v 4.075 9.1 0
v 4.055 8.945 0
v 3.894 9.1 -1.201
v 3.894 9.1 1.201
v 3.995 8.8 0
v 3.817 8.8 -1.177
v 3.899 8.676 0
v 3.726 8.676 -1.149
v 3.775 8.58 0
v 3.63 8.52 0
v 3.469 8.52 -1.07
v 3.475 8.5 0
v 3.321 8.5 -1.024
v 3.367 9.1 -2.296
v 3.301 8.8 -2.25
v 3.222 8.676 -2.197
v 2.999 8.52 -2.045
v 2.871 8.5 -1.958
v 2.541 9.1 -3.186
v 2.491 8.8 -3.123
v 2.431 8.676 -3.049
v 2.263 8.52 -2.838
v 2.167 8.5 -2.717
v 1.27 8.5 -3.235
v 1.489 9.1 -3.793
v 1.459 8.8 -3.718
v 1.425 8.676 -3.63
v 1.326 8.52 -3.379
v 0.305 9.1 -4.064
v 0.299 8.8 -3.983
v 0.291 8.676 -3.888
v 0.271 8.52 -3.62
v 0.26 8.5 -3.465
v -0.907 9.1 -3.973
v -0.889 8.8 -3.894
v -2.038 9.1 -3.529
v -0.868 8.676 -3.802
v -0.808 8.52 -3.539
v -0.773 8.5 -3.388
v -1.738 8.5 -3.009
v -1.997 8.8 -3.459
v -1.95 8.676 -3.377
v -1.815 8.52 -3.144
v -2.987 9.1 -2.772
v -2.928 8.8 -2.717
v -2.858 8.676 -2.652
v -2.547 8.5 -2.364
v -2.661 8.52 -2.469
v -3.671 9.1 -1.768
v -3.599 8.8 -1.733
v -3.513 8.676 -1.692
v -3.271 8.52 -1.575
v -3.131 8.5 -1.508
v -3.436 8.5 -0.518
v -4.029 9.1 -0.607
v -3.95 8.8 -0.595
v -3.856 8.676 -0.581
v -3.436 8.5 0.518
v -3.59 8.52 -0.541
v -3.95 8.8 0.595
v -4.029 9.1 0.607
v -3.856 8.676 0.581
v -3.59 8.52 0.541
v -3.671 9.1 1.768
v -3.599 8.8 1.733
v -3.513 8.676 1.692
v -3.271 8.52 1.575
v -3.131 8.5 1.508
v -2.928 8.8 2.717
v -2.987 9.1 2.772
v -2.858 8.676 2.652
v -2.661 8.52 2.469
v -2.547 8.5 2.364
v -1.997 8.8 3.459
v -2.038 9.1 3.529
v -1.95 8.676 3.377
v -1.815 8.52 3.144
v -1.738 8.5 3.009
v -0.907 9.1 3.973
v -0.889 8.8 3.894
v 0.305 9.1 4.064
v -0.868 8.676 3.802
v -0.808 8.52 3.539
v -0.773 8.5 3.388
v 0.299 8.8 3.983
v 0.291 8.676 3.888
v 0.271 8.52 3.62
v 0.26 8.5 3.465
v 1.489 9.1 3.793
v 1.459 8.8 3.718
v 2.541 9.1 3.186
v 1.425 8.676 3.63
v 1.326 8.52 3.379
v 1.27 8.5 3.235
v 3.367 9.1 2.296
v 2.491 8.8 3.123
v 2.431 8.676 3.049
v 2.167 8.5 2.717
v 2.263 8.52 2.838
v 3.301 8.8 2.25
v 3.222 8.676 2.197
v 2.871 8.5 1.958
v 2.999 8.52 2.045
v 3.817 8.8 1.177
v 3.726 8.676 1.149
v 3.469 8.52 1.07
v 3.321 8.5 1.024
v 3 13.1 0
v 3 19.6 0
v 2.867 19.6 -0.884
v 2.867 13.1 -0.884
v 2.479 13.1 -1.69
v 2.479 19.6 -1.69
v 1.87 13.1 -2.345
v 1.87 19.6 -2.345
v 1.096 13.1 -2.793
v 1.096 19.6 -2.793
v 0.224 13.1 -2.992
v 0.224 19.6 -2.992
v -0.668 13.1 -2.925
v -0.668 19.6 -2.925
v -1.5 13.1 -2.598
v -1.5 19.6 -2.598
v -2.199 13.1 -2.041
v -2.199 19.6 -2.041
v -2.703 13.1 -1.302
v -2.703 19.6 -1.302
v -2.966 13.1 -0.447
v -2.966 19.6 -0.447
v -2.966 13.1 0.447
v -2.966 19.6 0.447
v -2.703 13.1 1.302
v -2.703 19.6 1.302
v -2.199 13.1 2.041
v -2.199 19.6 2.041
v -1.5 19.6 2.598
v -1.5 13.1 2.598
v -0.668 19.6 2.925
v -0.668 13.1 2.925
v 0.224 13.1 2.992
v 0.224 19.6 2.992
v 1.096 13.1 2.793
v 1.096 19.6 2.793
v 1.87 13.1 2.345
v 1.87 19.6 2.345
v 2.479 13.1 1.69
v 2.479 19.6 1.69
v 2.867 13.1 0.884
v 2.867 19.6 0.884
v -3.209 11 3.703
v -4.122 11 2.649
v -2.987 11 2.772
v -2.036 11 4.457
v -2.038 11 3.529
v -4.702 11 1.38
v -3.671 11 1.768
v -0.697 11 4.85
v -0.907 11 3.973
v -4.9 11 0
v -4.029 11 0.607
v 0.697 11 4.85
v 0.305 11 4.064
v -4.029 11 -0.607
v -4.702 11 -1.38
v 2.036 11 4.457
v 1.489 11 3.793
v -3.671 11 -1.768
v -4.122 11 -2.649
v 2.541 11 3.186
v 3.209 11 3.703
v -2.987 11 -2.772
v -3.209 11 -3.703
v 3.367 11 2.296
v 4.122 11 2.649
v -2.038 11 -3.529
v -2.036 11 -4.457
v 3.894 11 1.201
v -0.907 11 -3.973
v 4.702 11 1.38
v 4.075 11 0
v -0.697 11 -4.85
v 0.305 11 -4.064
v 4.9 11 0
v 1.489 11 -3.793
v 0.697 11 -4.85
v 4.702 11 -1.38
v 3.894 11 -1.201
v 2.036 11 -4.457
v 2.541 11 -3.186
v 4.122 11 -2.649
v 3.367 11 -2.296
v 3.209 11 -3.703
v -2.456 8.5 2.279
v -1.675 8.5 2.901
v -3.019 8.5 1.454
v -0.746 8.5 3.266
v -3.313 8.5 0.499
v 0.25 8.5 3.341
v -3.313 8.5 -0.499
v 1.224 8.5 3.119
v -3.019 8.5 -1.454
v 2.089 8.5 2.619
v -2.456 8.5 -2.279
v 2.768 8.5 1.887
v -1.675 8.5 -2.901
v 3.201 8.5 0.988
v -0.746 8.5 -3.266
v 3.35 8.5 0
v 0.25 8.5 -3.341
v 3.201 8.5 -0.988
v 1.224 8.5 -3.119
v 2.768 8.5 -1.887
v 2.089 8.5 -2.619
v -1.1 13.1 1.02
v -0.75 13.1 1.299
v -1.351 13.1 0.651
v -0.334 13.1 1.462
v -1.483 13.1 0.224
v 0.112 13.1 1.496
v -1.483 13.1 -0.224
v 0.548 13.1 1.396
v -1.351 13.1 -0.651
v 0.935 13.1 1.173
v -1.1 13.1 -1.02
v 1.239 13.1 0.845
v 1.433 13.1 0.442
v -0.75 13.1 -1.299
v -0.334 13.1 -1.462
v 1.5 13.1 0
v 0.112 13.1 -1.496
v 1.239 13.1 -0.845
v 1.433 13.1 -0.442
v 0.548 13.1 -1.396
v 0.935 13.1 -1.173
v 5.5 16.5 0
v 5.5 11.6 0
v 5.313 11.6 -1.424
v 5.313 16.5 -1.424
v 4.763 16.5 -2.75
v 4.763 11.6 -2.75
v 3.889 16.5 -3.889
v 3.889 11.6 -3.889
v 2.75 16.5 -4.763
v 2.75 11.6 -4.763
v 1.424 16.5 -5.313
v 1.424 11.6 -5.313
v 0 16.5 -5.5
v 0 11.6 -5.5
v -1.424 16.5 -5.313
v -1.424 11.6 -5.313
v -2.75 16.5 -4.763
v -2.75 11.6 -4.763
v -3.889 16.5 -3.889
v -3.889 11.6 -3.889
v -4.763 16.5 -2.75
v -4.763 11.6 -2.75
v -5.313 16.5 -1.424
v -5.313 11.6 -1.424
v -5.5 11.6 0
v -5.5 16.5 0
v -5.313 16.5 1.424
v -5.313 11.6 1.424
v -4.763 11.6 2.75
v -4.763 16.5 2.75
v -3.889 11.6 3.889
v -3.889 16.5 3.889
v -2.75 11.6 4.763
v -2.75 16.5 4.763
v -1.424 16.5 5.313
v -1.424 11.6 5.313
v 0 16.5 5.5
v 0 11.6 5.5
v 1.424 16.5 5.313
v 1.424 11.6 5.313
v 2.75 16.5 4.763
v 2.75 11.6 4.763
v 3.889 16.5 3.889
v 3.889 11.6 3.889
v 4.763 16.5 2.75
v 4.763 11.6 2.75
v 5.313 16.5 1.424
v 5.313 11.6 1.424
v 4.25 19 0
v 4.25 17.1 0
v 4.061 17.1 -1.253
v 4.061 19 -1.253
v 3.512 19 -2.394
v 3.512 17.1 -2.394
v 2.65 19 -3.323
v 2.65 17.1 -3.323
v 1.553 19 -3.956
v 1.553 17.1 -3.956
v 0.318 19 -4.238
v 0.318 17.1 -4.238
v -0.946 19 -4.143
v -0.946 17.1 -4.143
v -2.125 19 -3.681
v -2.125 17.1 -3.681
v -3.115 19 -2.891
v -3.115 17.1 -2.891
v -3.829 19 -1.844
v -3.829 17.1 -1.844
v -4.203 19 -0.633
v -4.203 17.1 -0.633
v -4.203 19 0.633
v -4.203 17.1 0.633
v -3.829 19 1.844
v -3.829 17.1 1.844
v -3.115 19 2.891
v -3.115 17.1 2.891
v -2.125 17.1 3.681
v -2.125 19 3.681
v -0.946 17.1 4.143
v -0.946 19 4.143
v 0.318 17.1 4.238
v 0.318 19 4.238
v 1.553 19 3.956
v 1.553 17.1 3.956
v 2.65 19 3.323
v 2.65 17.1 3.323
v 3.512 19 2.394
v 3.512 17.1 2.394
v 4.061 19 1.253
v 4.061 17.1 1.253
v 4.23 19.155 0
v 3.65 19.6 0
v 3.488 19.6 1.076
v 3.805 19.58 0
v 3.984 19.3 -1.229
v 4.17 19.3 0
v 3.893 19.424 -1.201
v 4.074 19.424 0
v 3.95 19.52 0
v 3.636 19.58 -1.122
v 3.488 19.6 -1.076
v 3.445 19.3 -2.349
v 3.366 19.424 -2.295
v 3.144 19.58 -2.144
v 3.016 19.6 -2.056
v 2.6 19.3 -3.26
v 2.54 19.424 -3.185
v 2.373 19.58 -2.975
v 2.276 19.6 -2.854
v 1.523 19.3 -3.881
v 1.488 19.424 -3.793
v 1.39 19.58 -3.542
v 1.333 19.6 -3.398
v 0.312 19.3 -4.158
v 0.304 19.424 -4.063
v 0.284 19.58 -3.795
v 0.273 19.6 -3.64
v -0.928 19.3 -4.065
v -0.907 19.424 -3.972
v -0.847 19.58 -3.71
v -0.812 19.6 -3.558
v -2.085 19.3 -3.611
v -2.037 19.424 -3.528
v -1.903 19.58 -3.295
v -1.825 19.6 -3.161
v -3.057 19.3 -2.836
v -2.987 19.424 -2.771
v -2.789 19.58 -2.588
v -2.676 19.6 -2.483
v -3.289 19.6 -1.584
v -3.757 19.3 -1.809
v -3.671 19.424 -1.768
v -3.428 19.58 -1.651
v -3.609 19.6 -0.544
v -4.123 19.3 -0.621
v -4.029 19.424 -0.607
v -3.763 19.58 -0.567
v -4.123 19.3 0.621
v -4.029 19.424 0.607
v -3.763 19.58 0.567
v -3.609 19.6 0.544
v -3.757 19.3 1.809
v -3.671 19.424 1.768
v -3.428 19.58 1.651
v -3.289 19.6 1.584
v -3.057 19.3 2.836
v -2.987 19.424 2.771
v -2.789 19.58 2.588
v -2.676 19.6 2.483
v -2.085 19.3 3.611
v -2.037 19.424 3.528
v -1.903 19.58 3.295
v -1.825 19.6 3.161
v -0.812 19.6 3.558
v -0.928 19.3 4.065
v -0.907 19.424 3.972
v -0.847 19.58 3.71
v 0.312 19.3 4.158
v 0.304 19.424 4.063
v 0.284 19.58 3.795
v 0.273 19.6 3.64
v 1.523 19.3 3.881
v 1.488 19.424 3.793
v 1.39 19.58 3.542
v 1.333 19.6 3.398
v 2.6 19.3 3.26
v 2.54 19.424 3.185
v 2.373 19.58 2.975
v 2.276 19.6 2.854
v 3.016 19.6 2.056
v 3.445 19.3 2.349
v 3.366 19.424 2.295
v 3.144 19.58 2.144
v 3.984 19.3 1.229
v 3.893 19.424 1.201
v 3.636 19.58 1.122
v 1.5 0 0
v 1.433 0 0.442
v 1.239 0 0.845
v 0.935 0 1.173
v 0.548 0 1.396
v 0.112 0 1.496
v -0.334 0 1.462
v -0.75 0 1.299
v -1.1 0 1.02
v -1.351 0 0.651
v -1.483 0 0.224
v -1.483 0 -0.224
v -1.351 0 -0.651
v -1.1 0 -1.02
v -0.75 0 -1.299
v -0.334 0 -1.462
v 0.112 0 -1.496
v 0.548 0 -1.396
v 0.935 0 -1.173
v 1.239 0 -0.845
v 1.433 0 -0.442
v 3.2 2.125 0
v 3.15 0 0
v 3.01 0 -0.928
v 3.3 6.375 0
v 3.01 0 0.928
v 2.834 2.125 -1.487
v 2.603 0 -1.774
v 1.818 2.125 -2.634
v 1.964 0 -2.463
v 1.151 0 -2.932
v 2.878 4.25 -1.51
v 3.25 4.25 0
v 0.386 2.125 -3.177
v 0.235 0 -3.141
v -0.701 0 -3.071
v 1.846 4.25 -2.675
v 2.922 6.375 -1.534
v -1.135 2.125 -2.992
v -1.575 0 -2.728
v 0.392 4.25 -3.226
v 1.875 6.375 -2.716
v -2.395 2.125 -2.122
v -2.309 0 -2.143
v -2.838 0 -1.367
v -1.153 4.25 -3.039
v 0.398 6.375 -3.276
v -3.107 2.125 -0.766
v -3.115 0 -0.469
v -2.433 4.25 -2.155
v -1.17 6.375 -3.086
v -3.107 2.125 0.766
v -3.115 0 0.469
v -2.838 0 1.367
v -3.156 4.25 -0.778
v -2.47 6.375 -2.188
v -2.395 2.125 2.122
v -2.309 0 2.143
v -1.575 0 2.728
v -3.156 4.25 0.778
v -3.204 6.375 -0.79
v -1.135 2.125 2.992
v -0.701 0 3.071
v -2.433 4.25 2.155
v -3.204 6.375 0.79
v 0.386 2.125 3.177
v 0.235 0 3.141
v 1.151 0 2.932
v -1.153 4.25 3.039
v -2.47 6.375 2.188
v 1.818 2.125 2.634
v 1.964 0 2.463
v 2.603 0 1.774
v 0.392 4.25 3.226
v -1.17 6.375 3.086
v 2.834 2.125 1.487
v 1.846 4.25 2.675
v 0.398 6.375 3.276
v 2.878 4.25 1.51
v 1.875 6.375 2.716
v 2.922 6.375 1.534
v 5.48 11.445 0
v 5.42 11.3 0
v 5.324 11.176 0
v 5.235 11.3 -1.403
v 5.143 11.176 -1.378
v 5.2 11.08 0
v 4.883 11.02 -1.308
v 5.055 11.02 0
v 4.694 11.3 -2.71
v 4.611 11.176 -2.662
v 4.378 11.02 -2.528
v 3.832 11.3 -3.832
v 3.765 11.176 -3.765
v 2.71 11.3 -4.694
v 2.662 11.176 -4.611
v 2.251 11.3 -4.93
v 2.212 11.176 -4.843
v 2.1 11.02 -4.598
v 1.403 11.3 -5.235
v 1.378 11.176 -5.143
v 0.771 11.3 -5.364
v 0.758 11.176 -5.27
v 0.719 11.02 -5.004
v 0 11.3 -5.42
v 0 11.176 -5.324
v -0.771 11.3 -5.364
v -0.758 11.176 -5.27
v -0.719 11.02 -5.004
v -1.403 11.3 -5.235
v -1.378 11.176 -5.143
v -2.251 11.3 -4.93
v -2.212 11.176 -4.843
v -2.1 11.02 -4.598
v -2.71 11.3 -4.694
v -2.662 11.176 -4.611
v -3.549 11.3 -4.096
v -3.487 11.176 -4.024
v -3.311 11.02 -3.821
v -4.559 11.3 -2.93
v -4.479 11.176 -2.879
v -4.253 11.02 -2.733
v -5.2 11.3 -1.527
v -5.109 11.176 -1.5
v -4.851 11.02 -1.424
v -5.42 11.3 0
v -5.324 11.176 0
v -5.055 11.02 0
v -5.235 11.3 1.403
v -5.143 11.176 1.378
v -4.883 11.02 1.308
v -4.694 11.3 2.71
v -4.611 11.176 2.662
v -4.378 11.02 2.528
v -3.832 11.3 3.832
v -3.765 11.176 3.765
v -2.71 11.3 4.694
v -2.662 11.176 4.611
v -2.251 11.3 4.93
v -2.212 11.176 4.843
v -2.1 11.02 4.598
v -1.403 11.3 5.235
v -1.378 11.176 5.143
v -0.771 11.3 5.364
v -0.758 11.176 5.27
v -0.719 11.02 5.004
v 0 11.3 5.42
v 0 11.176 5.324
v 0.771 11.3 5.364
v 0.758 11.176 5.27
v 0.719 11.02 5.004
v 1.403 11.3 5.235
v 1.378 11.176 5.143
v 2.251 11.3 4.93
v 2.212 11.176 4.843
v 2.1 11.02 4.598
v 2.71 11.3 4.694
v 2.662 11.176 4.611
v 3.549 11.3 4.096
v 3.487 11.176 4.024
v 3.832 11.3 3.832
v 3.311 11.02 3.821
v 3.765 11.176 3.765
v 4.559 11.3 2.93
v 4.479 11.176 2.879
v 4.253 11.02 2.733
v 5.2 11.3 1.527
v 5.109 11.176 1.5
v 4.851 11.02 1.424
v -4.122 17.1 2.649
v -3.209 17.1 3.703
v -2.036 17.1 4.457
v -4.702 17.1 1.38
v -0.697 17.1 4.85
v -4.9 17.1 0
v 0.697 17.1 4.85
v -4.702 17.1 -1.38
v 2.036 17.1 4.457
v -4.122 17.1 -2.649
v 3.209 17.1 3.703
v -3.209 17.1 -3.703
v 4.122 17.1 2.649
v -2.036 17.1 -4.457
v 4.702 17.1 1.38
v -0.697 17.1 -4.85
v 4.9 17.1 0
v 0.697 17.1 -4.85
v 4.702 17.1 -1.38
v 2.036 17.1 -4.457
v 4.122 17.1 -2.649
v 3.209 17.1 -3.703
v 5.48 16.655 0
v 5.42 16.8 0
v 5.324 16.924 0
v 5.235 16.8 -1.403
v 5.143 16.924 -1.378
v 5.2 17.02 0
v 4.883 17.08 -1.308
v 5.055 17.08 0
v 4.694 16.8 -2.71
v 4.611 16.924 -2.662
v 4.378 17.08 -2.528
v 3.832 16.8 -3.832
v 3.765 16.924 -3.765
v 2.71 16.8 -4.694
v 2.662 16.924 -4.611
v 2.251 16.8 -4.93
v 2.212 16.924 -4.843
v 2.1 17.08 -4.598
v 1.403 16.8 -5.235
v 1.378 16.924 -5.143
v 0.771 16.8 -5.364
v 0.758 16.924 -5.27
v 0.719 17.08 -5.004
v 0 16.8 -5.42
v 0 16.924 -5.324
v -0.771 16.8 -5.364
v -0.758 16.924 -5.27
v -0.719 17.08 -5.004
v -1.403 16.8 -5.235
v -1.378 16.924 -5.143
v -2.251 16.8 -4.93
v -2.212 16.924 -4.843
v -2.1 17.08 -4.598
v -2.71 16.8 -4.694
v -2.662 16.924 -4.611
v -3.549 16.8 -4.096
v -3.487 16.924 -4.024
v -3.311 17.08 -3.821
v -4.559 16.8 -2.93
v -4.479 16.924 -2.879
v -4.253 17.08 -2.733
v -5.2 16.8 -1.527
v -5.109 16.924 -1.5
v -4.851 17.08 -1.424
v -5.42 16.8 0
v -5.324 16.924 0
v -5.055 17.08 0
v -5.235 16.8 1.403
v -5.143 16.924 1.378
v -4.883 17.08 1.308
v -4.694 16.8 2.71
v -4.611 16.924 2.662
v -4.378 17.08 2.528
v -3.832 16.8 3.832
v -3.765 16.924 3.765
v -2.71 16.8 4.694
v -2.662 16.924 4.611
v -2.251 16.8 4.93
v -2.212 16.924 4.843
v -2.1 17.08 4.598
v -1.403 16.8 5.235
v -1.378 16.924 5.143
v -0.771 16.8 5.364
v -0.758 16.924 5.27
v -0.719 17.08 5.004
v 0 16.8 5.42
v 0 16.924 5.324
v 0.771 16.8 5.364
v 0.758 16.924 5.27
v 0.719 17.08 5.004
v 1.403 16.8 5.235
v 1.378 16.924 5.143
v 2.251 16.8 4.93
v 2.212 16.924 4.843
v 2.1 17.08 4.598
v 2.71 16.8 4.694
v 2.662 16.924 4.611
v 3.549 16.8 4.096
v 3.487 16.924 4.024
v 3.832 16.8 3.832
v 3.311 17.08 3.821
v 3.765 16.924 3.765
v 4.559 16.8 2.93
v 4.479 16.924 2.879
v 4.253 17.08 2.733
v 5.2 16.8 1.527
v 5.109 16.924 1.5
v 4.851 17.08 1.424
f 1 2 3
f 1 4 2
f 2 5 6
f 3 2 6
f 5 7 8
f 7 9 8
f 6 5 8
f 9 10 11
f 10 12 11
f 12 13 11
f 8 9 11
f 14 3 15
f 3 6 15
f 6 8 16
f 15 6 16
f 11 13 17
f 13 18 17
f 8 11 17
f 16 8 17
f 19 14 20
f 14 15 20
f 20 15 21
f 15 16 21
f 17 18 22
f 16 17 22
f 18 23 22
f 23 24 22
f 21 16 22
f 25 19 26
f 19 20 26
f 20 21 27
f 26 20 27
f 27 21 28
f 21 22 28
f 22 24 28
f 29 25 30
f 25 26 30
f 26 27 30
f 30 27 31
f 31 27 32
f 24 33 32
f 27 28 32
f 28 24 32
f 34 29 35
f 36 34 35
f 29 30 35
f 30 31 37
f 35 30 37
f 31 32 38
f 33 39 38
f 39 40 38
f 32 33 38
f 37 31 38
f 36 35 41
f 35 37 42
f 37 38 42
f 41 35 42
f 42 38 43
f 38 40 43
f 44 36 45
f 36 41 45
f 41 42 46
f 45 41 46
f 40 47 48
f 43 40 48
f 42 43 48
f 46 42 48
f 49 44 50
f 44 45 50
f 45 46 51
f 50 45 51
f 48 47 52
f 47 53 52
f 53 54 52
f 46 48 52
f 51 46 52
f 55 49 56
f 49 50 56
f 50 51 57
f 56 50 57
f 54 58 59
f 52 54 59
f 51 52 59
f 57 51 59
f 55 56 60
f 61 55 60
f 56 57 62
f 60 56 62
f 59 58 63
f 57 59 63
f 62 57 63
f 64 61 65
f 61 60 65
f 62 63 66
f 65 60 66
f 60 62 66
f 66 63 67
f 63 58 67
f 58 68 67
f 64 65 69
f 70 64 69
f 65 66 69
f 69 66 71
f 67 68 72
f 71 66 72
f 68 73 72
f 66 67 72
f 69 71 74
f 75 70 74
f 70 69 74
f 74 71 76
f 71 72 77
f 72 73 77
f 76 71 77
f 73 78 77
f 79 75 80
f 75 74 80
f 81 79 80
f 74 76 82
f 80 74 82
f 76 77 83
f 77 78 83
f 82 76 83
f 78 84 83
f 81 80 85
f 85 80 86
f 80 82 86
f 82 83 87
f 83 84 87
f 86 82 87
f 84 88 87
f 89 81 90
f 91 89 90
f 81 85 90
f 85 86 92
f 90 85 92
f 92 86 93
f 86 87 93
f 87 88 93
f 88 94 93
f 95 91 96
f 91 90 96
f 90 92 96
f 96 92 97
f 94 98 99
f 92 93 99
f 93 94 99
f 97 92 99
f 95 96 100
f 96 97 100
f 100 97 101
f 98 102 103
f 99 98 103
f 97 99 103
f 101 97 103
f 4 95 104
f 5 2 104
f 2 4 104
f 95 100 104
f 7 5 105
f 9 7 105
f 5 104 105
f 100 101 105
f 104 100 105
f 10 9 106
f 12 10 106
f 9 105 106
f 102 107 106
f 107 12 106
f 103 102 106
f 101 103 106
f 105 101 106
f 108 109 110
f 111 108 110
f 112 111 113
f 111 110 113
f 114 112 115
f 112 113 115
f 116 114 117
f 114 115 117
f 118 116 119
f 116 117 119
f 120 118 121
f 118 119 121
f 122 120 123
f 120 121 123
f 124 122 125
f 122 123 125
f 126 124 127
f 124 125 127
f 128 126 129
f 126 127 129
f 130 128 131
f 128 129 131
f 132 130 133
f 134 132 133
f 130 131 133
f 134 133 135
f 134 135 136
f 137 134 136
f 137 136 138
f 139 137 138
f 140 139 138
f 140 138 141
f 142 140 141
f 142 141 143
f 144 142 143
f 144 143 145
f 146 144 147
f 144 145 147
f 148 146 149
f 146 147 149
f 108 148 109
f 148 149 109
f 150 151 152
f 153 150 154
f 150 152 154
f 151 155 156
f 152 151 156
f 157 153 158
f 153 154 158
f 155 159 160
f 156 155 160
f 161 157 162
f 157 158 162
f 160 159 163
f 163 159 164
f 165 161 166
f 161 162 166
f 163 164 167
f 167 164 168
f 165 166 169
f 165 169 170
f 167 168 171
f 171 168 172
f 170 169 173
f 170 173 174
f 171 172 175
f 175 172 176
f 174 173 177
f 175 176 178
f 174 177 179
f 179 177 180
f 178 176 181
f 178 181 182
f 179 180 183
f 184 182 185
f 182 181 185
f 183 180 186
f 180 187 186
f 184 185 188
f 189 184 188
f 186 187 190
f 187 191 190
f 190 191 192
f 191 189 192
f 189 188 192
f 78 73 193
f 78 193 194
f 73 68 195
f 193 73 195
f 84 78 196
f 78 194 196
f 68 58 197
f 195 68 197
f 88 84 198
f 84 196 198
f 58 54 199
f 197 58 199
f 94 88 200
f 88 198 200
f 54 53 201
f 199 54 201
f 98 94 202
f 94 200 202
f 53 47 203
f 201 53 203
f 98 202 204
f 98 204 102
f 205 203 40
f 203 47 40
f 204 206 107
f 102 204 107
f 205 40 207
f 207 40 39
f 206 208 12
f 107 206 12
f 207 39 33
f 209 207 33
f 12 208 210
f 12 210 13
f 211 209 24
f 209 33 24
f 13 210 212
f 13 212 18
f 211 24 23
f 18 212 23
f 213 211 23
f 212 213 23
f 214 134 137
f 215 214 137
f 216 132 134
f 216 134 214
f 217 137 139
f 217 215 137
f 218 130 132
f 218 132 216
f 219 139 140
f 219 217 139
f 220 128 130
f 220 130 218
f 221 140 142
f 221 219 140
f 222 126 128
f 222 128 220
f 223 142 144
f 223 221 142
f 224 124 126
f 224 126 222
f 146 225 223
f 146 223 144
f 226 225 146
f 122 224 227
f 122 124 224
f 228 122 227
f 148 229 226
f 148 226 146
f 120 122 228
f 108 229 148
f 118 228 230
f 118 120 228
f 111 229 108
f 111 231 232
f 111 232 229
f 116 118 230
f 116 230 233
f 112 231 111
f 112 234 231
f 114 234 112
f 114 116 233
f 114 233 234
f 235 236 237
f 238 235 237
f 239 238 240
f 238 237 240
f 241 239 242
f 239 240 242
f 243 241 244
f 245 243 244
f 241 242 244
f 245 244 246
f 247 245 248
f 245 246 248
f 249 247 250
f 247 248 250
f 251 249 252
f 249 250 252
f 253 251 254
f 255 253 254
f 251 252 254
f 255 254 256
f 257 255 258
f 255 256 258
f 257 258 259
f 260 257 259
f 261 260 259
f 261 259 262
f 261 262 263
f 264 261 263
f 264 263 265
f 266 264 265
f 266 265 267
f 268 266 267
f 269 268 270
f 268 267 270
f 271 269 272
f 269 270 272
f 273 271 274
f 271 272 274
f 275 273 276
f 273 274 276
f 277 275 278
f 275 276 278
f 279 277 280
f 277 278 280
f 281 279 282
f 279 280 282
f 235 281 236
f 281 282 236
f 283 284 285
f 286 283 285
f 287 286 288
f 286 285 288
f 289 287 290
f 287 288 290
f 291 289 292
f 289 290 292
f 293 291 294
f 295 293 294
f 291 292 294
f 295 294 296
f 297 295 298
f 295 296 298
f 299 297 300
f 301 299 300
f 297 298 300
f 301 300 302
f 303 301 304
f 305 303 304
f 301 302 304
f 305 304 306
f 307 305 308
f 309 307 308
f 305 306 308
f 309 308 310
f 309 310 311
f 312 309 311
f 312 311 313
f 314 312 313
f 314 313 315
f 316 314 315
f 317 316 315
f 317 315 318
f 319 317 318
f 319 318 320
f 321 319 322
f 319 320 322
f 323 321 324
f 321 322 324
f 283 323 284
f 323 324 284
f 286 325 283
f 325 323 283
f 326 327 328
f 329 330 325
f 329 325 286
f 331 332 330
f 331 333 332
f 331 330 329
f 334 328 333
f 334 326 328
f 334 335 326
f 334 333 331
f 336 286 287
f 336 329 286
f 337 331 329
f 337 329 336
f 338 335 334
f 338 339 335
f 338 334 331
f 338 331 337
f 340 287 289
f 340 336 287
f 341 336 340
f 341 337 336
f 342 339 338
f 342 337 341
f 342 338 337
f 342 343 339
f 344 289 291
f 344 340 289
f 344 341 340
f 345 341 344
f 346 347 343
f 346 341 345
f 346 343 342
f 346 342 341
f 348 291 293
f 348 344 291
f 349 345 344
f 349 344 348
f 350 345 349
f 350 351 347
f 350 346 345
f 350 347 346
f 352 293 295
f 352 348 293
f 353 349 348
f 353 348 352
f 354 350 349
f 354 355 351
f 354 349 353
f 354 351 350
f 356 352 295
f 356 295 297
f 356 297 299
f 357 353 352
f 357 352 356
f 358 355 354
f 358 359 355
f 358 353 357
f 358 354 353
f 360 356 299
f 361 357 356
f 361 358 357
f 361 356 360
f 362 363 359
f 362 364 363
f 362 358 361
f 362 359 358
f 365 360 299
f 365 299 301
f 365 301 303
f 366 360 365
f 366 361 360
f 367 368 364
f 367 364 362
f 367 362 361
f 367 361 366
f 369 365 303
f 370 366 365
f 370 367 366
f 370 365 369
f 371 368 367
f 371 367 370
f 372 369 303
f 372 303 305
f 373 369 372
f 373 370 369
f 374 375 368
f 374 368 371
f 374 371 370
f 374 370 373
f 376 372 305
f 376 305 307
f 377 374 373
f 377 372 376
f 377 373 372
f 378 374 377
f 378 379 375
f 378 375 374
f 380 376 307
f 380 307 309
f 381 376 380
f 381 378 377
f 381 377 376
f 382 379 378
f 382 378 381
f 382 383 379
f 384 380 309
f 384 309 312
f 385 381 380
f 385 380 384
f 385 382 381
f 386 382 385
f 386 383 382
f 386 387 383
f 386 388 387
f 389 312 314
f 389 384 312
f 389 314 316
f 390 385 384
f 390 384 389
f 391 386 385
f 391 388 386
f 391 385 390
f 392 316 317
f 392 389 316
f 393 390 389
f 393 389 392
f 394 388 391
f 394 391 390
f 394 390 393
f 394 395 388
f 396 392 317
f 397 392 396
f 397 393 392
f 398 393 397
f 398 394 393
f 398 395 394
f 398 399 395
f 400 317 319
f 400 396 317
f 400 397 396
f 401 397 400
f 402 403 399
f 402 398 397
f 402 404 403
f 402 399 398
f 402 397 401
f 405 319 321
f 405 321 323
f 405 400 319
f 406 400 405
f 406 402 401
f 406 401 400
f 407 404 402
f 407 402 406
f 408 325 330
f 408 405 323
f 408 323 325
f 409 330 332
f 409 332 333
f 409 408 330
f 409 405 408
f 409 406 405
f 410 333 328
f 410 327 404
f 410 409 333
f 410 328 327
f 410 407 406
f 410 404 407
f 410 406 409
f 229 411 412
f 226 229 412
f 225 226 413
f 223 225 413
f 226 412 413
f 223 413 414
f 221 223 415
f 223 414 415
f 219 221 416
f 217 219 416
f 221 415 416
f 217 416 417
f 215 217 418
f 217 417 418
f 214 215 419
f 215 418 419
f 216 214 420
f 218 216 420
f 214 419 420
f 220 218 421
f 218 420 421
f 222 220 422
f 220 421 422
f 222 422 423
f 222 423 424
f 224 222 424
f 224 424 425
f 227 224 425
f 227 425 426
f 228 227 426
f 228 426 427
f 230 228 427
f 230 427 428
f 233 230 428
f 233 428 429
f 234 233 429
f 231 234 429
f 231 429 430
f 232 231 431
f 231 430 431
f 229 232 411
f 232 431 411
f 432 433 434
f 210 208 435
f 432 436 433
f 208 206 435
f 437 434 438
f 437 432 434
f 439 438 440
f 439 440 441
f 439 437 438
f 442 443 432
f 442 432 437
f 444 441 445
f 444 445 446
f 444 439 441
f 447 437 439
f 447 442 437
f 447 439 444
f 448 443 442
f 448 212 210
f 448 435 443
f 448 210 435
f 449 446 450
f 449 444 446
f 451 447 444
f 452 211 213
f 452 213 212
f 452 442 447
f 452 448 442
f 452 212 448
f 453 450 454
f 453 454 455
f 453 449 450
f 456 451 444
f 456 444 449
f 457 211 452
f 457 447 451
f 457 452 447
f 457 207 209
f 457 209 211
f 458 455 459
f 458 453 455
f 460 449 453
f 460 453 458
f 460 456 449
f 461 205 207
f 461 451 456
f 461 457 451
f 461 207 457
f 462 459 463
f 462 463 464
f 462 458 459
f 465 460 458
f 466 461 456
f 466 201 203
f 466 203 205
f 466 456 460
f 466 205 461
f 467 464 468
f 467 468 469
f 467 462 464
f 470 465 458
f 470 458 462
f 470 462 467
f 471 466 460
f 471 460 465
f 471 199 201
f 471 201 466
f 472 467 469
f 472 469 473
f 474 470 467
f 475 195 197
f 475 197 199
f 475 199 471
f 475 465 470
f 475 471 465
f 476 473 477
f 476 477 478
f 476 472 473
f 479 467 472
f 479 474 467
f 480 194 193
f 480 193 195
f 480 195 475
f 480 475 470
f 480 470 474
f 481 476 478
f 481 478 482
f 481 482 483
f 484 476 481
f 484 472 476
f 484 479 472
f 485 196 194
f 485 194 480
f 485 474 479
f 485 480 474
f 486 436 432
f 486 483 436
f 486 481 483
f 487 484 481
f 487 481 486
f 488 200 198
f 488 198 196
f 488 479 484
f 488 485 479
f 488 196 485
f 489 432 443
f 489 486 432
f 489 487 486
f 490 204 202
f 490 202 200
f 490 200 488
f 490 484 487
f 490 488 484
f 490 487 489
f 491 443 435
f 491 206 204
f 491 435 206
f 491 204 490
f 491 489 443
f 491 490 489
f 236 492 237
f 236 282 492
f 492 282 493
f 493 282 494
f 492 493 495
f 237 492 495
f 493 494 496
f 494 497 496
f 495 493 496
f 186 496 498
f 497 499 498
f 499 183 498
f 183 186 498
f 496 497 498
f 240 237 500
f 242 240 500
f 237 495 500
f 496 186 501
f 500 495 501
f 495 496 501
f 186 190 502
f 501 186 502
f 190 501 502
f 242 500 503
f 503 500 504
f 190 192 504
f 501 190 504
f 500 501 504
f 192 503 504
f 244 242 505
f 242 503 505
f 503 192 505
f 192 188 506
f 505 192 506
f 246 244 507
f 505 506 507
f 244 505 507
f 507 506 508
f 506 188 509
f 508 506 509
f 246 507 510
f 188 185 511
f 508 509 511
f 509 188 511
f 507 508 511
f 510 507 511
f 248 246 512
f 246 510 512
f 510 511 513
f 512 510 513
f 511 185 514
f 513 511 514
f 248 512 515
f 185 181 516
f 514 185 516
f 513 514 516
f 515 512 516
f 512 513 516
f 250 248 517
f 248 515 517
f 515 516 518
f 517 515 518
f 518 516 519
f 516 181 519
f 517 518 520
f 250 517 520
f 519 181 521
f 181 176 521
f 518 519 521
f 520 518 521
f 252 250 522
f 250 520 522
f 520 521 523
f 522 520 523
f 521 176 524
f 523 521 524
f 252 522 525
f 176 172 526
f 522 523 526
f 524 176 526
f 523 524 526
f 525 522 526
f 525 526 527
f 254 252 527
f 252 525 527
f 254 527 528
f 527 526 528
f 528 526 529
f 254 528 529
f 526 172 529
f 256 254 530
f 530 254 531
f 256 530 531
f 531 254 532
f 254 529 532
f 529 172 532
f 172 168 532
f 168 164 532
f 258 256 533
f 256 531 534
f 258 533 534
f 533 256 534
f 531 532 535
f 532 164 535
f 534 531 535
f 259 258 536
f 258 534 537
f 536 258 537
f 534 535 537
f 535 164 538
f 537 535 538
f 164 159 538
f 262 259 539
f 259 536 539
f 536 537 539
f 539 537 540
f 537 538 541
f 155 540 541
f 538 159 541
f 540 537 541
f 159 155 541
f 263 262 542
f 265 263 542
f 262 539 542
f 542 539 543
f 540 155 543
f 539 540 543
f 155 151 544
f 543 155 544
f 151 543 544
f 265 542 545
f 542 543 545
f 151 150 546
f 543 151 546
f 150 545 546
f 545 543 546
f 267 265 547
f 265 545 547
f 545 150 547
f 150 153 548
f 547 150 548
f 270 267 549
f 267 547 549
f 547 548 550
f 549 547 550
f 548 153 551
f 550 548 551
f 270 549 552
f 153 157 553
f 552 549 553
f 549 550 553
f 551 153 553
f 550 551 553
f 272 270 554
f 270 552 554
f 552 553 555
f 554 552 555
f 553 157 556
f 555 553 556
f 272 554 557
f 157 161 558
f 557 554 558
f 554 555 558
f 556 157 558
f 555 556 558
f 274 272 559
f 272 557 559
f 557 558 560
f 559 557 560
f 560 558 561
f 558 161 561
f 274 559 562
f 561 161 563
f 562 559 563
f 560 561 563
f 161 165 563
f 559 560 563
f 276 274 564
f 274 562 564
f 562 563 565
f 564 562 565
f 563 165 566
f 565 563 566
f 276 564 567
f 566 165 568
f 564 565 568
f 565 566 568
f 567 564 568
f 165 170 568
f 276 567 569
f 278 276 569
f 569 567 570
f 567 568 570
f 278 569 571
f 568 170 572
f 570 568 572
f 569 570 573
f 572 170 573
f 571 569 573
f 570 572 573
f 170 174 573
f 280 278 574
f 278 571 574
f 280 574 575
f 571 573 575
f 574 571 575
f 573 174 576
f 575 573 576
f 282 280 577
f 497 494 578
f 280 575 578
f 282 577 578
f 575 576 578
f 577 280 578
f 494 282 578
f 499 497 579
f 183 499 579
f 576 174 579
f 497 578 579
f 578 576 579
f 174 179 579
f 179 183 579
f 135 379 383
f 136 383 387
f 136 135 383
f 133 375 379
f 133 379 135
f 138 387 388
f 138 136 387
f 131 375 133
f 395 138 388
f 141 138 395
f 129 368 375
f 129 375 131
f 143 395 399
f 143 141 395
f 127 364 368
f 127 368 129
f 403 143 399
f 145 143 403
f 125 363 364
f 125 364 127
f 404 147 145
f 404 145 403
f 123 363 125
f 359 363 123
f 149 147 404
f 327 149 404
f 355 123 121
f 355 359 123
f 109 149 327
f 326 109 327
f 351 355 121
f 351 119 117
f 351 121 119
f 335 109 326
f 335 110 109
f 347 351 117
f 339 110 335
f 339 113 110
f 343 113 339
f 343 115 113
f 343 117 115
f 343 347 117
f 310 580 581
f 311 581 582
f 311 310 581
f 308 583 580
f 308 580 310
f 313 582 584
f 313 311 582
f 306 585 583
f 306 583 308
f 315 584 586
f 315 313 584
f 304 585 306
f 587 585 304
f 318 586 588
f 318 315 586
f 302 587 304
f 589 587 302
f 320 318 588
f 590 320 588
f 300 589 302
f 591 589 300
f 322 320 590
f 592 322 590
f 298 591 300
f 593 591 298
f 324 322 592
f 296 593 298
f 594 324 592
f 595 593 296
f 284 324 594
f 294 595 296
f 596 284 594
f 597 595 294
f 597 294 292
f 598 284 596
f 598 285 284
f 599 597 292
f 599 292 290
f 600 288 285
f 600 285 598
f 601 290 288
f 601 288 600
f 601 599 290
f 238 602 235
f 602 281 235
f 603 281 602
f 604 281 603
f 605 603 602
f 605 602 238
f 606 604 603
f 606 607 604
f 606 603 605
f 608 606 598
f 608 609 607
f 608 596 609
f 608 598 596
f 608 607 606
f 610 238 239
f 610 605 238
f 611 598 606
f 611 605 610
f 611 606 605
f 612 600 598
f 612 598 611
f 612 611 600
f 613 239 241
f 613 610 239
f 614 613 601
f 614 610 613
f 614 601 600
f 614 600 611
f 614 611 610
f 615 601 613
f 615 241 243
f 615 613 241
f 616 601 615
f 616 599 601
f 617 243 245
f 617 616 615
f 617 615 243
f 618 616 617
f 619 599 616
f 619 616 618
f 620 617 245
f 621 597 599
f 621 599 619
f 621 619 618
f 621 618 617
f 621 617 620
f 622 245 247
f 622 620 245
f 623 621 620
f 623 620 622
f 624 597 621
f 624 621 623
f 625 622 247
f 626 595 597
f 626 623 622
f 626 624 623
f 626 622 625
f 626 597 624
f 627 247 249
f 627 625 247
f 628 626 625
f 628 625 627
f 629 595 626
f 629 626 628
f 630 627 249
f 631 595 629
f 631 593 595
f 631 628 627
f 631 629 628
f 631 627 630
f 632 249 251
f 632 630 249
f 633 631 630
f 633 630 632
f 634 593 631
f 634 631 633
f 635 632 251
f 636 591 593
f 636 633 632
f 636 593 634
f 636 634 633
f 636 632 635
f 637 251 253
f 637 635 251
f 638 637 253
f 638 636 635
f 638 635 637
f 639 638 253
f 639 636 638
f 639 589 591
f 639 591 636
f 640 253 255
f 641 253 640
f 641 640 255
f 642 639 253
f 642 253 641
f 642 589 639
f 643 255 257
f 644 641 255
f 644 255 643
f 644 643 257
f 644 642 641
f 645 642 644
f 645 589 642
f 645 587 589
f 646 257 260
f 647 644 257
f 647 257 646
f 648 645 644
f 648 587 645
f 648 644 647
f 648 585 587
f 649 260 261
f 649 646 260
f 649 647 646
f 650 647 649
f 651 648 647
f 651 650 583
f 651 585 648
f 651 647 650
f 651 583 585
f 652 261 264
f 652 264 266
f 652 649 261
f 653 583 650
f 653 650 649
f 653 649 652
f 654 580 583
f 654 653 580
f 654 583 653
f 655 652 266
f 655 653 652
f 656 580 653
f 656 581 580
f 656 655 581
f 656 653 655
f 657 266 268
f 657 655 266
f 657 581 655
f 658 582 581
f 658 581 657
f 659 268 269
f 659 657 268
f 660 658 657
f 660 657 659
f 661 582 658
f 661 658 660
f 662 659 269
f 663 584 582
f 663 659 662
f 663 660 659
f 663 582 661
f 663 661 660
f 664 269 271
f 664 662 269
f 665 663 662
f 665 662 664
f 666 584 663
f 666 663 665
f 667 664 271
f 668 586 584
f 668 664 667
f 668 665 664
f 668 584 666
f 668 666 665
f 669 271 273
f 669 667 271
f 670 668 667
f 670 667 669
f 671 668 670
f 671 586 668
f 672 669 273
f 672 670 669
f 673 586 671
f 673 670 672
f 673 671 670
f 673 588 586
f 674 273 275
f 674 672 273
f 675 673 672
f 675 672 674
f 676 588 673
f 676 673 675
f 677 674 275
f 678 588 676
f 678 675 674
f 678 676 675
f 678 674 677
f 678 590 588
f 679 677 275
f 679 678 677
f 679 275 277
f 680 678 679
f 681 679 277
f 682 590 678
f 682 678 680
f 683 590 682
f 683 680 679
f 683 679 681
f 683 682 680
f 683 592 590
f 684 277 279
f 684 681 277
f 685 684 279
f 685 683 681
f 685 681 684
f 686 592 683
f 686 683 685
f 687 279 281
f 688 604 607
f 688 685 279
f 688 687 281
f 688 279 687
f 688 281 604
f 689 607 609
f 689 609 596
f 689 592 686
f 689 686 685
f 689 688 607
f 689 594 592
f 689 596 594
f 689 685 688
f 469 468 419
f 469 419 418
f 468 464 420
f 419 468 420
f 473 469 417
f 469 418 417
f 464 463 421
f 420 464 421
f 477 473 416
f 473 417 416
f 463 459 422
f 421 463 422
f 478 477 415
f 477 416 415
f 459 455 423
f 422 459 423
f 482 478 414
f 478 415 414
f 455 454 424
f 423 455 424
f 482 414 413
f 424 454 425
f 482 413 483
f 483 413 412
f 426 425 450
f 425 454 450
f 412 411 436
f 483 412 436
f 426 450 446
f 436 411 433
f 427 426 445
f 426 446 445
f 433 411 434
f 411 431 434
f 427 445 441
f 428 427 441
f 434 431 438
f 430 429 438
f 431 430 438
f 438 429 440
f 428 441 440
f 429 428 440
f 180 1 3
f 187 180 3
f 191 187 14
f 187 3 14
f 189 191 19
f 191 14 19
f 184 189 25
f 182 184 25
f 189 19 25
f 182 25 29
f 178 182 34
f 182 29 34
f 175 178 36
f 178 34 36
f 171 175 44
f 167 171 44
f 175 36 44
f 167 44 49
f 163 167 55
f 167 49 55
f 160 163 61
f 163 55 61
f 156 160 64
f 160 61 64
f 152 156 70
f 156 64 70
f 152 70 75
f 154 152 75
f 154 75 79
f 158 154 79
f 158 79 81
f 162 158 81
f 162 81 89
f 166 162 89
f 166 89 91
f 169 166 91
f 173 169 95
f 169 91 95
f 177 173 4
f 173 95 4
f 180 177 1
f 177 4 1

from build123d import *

# Parameters (mm, degrees)
SKETCH1_R           = 3.15
BOSS_EXTRUDE1_DEPTH = 8.5
BOSS_EXTRUDE1_TAPER = -1.35
SKETCH2_R           = 4.075
BOSS_EXTRUDE2_DEPTH = 2.5
SKETCH3_R           = 5.5
BOSS_EXTRUDE3_DEPTH = 6.1
SKETCH4_R           = 4.25
BOSS_EXTRUDE4_DEPTH = 2.5
SKETCH5_R           = 3
CUT_EXTRUDE1_DEPTH  = 6.5
SKETCH6_R           = 1.5
CUT_EXTRUDE2_DEPTH  = 13.1
FILLET1_R           = 0.6


with BuildPart() as part:
    # Sketch1 → Boss-Extrude1 (new body)
    with BuildSketch(Plane(origin=(0, 0, 0), x_dir=(1, 0, 0), z_dir=(0, 1, 0))):
        Circle(SKETCH1_R)
    extrude(amount=BOSS_EXTRUDE1_DEPTH, taper=BOSS_EXTRUDE1_TAPER)

    # Sketch2 → Boss-Extrude2 (add)
    with BuildSketch(Plane(origin=(0, 8.5, 0), x_dir=(1, 0, 0), z_dir=(0, 1, 0))):
        Circle(SKETCH2_R)
    extrude(amount=BOSS_EXTRUDE2_DEPTH)

    # Sketch3 → Boss-Extrude3 (add)
    with BuildSketch(Plane(origin=(0, 11, 0), x_dir=(1, 0, 0), z_dir=(0, 1, 0))):
        Circle(SKETCH3_R)
    extrude(amount=BOSS_EXTRUDE3_DEPTH)

    # Sketch4 → Boss-Extrude4 (add)
    with BuildSketch(Plane(origin=(0, 17.1, 0), x_dir=(1, 0, 0), z_dir=(0, 1, 0))):
        Circle(SKETCH4_R)
    extrude(amount=BOSS_EXTRUDE4_DEPTH)

    # Sketch5 → Cut-Extrude1 (cut)
    with BuildSketch(Plane(origin=(0, 19.6, 0), x_dir=(1, 0, 0), z_dir=(0, 1, 0))):
        Circle(SKETCH5_R)
    extrude(amount=-CUT_EXTRUDE1_DEPTH, mode=Mode.SUBTRACT)

    # Sketch6 → Cut-Extrude2 (cut)
    with BuildSketch(Plane.XZ):
        Circle(SKETCH6_R)
    extrude(amount=-CUT_EXTRUDE2_DEPTH, mode=Mode.SUBTRACT)

    # Fillet1
    fillet1_edges = [part.edges().sort_by_distance(p)[0] for p in [
        (-5.5, 17.1, 0),
        (-4.25, 19.6, 0),
        (-4.075, 8.5, 0),
        (-5.5, 11, 0),
    ]]
    fillet(fillet1_edges, radius=FILLET1_R)


solid = part.part
